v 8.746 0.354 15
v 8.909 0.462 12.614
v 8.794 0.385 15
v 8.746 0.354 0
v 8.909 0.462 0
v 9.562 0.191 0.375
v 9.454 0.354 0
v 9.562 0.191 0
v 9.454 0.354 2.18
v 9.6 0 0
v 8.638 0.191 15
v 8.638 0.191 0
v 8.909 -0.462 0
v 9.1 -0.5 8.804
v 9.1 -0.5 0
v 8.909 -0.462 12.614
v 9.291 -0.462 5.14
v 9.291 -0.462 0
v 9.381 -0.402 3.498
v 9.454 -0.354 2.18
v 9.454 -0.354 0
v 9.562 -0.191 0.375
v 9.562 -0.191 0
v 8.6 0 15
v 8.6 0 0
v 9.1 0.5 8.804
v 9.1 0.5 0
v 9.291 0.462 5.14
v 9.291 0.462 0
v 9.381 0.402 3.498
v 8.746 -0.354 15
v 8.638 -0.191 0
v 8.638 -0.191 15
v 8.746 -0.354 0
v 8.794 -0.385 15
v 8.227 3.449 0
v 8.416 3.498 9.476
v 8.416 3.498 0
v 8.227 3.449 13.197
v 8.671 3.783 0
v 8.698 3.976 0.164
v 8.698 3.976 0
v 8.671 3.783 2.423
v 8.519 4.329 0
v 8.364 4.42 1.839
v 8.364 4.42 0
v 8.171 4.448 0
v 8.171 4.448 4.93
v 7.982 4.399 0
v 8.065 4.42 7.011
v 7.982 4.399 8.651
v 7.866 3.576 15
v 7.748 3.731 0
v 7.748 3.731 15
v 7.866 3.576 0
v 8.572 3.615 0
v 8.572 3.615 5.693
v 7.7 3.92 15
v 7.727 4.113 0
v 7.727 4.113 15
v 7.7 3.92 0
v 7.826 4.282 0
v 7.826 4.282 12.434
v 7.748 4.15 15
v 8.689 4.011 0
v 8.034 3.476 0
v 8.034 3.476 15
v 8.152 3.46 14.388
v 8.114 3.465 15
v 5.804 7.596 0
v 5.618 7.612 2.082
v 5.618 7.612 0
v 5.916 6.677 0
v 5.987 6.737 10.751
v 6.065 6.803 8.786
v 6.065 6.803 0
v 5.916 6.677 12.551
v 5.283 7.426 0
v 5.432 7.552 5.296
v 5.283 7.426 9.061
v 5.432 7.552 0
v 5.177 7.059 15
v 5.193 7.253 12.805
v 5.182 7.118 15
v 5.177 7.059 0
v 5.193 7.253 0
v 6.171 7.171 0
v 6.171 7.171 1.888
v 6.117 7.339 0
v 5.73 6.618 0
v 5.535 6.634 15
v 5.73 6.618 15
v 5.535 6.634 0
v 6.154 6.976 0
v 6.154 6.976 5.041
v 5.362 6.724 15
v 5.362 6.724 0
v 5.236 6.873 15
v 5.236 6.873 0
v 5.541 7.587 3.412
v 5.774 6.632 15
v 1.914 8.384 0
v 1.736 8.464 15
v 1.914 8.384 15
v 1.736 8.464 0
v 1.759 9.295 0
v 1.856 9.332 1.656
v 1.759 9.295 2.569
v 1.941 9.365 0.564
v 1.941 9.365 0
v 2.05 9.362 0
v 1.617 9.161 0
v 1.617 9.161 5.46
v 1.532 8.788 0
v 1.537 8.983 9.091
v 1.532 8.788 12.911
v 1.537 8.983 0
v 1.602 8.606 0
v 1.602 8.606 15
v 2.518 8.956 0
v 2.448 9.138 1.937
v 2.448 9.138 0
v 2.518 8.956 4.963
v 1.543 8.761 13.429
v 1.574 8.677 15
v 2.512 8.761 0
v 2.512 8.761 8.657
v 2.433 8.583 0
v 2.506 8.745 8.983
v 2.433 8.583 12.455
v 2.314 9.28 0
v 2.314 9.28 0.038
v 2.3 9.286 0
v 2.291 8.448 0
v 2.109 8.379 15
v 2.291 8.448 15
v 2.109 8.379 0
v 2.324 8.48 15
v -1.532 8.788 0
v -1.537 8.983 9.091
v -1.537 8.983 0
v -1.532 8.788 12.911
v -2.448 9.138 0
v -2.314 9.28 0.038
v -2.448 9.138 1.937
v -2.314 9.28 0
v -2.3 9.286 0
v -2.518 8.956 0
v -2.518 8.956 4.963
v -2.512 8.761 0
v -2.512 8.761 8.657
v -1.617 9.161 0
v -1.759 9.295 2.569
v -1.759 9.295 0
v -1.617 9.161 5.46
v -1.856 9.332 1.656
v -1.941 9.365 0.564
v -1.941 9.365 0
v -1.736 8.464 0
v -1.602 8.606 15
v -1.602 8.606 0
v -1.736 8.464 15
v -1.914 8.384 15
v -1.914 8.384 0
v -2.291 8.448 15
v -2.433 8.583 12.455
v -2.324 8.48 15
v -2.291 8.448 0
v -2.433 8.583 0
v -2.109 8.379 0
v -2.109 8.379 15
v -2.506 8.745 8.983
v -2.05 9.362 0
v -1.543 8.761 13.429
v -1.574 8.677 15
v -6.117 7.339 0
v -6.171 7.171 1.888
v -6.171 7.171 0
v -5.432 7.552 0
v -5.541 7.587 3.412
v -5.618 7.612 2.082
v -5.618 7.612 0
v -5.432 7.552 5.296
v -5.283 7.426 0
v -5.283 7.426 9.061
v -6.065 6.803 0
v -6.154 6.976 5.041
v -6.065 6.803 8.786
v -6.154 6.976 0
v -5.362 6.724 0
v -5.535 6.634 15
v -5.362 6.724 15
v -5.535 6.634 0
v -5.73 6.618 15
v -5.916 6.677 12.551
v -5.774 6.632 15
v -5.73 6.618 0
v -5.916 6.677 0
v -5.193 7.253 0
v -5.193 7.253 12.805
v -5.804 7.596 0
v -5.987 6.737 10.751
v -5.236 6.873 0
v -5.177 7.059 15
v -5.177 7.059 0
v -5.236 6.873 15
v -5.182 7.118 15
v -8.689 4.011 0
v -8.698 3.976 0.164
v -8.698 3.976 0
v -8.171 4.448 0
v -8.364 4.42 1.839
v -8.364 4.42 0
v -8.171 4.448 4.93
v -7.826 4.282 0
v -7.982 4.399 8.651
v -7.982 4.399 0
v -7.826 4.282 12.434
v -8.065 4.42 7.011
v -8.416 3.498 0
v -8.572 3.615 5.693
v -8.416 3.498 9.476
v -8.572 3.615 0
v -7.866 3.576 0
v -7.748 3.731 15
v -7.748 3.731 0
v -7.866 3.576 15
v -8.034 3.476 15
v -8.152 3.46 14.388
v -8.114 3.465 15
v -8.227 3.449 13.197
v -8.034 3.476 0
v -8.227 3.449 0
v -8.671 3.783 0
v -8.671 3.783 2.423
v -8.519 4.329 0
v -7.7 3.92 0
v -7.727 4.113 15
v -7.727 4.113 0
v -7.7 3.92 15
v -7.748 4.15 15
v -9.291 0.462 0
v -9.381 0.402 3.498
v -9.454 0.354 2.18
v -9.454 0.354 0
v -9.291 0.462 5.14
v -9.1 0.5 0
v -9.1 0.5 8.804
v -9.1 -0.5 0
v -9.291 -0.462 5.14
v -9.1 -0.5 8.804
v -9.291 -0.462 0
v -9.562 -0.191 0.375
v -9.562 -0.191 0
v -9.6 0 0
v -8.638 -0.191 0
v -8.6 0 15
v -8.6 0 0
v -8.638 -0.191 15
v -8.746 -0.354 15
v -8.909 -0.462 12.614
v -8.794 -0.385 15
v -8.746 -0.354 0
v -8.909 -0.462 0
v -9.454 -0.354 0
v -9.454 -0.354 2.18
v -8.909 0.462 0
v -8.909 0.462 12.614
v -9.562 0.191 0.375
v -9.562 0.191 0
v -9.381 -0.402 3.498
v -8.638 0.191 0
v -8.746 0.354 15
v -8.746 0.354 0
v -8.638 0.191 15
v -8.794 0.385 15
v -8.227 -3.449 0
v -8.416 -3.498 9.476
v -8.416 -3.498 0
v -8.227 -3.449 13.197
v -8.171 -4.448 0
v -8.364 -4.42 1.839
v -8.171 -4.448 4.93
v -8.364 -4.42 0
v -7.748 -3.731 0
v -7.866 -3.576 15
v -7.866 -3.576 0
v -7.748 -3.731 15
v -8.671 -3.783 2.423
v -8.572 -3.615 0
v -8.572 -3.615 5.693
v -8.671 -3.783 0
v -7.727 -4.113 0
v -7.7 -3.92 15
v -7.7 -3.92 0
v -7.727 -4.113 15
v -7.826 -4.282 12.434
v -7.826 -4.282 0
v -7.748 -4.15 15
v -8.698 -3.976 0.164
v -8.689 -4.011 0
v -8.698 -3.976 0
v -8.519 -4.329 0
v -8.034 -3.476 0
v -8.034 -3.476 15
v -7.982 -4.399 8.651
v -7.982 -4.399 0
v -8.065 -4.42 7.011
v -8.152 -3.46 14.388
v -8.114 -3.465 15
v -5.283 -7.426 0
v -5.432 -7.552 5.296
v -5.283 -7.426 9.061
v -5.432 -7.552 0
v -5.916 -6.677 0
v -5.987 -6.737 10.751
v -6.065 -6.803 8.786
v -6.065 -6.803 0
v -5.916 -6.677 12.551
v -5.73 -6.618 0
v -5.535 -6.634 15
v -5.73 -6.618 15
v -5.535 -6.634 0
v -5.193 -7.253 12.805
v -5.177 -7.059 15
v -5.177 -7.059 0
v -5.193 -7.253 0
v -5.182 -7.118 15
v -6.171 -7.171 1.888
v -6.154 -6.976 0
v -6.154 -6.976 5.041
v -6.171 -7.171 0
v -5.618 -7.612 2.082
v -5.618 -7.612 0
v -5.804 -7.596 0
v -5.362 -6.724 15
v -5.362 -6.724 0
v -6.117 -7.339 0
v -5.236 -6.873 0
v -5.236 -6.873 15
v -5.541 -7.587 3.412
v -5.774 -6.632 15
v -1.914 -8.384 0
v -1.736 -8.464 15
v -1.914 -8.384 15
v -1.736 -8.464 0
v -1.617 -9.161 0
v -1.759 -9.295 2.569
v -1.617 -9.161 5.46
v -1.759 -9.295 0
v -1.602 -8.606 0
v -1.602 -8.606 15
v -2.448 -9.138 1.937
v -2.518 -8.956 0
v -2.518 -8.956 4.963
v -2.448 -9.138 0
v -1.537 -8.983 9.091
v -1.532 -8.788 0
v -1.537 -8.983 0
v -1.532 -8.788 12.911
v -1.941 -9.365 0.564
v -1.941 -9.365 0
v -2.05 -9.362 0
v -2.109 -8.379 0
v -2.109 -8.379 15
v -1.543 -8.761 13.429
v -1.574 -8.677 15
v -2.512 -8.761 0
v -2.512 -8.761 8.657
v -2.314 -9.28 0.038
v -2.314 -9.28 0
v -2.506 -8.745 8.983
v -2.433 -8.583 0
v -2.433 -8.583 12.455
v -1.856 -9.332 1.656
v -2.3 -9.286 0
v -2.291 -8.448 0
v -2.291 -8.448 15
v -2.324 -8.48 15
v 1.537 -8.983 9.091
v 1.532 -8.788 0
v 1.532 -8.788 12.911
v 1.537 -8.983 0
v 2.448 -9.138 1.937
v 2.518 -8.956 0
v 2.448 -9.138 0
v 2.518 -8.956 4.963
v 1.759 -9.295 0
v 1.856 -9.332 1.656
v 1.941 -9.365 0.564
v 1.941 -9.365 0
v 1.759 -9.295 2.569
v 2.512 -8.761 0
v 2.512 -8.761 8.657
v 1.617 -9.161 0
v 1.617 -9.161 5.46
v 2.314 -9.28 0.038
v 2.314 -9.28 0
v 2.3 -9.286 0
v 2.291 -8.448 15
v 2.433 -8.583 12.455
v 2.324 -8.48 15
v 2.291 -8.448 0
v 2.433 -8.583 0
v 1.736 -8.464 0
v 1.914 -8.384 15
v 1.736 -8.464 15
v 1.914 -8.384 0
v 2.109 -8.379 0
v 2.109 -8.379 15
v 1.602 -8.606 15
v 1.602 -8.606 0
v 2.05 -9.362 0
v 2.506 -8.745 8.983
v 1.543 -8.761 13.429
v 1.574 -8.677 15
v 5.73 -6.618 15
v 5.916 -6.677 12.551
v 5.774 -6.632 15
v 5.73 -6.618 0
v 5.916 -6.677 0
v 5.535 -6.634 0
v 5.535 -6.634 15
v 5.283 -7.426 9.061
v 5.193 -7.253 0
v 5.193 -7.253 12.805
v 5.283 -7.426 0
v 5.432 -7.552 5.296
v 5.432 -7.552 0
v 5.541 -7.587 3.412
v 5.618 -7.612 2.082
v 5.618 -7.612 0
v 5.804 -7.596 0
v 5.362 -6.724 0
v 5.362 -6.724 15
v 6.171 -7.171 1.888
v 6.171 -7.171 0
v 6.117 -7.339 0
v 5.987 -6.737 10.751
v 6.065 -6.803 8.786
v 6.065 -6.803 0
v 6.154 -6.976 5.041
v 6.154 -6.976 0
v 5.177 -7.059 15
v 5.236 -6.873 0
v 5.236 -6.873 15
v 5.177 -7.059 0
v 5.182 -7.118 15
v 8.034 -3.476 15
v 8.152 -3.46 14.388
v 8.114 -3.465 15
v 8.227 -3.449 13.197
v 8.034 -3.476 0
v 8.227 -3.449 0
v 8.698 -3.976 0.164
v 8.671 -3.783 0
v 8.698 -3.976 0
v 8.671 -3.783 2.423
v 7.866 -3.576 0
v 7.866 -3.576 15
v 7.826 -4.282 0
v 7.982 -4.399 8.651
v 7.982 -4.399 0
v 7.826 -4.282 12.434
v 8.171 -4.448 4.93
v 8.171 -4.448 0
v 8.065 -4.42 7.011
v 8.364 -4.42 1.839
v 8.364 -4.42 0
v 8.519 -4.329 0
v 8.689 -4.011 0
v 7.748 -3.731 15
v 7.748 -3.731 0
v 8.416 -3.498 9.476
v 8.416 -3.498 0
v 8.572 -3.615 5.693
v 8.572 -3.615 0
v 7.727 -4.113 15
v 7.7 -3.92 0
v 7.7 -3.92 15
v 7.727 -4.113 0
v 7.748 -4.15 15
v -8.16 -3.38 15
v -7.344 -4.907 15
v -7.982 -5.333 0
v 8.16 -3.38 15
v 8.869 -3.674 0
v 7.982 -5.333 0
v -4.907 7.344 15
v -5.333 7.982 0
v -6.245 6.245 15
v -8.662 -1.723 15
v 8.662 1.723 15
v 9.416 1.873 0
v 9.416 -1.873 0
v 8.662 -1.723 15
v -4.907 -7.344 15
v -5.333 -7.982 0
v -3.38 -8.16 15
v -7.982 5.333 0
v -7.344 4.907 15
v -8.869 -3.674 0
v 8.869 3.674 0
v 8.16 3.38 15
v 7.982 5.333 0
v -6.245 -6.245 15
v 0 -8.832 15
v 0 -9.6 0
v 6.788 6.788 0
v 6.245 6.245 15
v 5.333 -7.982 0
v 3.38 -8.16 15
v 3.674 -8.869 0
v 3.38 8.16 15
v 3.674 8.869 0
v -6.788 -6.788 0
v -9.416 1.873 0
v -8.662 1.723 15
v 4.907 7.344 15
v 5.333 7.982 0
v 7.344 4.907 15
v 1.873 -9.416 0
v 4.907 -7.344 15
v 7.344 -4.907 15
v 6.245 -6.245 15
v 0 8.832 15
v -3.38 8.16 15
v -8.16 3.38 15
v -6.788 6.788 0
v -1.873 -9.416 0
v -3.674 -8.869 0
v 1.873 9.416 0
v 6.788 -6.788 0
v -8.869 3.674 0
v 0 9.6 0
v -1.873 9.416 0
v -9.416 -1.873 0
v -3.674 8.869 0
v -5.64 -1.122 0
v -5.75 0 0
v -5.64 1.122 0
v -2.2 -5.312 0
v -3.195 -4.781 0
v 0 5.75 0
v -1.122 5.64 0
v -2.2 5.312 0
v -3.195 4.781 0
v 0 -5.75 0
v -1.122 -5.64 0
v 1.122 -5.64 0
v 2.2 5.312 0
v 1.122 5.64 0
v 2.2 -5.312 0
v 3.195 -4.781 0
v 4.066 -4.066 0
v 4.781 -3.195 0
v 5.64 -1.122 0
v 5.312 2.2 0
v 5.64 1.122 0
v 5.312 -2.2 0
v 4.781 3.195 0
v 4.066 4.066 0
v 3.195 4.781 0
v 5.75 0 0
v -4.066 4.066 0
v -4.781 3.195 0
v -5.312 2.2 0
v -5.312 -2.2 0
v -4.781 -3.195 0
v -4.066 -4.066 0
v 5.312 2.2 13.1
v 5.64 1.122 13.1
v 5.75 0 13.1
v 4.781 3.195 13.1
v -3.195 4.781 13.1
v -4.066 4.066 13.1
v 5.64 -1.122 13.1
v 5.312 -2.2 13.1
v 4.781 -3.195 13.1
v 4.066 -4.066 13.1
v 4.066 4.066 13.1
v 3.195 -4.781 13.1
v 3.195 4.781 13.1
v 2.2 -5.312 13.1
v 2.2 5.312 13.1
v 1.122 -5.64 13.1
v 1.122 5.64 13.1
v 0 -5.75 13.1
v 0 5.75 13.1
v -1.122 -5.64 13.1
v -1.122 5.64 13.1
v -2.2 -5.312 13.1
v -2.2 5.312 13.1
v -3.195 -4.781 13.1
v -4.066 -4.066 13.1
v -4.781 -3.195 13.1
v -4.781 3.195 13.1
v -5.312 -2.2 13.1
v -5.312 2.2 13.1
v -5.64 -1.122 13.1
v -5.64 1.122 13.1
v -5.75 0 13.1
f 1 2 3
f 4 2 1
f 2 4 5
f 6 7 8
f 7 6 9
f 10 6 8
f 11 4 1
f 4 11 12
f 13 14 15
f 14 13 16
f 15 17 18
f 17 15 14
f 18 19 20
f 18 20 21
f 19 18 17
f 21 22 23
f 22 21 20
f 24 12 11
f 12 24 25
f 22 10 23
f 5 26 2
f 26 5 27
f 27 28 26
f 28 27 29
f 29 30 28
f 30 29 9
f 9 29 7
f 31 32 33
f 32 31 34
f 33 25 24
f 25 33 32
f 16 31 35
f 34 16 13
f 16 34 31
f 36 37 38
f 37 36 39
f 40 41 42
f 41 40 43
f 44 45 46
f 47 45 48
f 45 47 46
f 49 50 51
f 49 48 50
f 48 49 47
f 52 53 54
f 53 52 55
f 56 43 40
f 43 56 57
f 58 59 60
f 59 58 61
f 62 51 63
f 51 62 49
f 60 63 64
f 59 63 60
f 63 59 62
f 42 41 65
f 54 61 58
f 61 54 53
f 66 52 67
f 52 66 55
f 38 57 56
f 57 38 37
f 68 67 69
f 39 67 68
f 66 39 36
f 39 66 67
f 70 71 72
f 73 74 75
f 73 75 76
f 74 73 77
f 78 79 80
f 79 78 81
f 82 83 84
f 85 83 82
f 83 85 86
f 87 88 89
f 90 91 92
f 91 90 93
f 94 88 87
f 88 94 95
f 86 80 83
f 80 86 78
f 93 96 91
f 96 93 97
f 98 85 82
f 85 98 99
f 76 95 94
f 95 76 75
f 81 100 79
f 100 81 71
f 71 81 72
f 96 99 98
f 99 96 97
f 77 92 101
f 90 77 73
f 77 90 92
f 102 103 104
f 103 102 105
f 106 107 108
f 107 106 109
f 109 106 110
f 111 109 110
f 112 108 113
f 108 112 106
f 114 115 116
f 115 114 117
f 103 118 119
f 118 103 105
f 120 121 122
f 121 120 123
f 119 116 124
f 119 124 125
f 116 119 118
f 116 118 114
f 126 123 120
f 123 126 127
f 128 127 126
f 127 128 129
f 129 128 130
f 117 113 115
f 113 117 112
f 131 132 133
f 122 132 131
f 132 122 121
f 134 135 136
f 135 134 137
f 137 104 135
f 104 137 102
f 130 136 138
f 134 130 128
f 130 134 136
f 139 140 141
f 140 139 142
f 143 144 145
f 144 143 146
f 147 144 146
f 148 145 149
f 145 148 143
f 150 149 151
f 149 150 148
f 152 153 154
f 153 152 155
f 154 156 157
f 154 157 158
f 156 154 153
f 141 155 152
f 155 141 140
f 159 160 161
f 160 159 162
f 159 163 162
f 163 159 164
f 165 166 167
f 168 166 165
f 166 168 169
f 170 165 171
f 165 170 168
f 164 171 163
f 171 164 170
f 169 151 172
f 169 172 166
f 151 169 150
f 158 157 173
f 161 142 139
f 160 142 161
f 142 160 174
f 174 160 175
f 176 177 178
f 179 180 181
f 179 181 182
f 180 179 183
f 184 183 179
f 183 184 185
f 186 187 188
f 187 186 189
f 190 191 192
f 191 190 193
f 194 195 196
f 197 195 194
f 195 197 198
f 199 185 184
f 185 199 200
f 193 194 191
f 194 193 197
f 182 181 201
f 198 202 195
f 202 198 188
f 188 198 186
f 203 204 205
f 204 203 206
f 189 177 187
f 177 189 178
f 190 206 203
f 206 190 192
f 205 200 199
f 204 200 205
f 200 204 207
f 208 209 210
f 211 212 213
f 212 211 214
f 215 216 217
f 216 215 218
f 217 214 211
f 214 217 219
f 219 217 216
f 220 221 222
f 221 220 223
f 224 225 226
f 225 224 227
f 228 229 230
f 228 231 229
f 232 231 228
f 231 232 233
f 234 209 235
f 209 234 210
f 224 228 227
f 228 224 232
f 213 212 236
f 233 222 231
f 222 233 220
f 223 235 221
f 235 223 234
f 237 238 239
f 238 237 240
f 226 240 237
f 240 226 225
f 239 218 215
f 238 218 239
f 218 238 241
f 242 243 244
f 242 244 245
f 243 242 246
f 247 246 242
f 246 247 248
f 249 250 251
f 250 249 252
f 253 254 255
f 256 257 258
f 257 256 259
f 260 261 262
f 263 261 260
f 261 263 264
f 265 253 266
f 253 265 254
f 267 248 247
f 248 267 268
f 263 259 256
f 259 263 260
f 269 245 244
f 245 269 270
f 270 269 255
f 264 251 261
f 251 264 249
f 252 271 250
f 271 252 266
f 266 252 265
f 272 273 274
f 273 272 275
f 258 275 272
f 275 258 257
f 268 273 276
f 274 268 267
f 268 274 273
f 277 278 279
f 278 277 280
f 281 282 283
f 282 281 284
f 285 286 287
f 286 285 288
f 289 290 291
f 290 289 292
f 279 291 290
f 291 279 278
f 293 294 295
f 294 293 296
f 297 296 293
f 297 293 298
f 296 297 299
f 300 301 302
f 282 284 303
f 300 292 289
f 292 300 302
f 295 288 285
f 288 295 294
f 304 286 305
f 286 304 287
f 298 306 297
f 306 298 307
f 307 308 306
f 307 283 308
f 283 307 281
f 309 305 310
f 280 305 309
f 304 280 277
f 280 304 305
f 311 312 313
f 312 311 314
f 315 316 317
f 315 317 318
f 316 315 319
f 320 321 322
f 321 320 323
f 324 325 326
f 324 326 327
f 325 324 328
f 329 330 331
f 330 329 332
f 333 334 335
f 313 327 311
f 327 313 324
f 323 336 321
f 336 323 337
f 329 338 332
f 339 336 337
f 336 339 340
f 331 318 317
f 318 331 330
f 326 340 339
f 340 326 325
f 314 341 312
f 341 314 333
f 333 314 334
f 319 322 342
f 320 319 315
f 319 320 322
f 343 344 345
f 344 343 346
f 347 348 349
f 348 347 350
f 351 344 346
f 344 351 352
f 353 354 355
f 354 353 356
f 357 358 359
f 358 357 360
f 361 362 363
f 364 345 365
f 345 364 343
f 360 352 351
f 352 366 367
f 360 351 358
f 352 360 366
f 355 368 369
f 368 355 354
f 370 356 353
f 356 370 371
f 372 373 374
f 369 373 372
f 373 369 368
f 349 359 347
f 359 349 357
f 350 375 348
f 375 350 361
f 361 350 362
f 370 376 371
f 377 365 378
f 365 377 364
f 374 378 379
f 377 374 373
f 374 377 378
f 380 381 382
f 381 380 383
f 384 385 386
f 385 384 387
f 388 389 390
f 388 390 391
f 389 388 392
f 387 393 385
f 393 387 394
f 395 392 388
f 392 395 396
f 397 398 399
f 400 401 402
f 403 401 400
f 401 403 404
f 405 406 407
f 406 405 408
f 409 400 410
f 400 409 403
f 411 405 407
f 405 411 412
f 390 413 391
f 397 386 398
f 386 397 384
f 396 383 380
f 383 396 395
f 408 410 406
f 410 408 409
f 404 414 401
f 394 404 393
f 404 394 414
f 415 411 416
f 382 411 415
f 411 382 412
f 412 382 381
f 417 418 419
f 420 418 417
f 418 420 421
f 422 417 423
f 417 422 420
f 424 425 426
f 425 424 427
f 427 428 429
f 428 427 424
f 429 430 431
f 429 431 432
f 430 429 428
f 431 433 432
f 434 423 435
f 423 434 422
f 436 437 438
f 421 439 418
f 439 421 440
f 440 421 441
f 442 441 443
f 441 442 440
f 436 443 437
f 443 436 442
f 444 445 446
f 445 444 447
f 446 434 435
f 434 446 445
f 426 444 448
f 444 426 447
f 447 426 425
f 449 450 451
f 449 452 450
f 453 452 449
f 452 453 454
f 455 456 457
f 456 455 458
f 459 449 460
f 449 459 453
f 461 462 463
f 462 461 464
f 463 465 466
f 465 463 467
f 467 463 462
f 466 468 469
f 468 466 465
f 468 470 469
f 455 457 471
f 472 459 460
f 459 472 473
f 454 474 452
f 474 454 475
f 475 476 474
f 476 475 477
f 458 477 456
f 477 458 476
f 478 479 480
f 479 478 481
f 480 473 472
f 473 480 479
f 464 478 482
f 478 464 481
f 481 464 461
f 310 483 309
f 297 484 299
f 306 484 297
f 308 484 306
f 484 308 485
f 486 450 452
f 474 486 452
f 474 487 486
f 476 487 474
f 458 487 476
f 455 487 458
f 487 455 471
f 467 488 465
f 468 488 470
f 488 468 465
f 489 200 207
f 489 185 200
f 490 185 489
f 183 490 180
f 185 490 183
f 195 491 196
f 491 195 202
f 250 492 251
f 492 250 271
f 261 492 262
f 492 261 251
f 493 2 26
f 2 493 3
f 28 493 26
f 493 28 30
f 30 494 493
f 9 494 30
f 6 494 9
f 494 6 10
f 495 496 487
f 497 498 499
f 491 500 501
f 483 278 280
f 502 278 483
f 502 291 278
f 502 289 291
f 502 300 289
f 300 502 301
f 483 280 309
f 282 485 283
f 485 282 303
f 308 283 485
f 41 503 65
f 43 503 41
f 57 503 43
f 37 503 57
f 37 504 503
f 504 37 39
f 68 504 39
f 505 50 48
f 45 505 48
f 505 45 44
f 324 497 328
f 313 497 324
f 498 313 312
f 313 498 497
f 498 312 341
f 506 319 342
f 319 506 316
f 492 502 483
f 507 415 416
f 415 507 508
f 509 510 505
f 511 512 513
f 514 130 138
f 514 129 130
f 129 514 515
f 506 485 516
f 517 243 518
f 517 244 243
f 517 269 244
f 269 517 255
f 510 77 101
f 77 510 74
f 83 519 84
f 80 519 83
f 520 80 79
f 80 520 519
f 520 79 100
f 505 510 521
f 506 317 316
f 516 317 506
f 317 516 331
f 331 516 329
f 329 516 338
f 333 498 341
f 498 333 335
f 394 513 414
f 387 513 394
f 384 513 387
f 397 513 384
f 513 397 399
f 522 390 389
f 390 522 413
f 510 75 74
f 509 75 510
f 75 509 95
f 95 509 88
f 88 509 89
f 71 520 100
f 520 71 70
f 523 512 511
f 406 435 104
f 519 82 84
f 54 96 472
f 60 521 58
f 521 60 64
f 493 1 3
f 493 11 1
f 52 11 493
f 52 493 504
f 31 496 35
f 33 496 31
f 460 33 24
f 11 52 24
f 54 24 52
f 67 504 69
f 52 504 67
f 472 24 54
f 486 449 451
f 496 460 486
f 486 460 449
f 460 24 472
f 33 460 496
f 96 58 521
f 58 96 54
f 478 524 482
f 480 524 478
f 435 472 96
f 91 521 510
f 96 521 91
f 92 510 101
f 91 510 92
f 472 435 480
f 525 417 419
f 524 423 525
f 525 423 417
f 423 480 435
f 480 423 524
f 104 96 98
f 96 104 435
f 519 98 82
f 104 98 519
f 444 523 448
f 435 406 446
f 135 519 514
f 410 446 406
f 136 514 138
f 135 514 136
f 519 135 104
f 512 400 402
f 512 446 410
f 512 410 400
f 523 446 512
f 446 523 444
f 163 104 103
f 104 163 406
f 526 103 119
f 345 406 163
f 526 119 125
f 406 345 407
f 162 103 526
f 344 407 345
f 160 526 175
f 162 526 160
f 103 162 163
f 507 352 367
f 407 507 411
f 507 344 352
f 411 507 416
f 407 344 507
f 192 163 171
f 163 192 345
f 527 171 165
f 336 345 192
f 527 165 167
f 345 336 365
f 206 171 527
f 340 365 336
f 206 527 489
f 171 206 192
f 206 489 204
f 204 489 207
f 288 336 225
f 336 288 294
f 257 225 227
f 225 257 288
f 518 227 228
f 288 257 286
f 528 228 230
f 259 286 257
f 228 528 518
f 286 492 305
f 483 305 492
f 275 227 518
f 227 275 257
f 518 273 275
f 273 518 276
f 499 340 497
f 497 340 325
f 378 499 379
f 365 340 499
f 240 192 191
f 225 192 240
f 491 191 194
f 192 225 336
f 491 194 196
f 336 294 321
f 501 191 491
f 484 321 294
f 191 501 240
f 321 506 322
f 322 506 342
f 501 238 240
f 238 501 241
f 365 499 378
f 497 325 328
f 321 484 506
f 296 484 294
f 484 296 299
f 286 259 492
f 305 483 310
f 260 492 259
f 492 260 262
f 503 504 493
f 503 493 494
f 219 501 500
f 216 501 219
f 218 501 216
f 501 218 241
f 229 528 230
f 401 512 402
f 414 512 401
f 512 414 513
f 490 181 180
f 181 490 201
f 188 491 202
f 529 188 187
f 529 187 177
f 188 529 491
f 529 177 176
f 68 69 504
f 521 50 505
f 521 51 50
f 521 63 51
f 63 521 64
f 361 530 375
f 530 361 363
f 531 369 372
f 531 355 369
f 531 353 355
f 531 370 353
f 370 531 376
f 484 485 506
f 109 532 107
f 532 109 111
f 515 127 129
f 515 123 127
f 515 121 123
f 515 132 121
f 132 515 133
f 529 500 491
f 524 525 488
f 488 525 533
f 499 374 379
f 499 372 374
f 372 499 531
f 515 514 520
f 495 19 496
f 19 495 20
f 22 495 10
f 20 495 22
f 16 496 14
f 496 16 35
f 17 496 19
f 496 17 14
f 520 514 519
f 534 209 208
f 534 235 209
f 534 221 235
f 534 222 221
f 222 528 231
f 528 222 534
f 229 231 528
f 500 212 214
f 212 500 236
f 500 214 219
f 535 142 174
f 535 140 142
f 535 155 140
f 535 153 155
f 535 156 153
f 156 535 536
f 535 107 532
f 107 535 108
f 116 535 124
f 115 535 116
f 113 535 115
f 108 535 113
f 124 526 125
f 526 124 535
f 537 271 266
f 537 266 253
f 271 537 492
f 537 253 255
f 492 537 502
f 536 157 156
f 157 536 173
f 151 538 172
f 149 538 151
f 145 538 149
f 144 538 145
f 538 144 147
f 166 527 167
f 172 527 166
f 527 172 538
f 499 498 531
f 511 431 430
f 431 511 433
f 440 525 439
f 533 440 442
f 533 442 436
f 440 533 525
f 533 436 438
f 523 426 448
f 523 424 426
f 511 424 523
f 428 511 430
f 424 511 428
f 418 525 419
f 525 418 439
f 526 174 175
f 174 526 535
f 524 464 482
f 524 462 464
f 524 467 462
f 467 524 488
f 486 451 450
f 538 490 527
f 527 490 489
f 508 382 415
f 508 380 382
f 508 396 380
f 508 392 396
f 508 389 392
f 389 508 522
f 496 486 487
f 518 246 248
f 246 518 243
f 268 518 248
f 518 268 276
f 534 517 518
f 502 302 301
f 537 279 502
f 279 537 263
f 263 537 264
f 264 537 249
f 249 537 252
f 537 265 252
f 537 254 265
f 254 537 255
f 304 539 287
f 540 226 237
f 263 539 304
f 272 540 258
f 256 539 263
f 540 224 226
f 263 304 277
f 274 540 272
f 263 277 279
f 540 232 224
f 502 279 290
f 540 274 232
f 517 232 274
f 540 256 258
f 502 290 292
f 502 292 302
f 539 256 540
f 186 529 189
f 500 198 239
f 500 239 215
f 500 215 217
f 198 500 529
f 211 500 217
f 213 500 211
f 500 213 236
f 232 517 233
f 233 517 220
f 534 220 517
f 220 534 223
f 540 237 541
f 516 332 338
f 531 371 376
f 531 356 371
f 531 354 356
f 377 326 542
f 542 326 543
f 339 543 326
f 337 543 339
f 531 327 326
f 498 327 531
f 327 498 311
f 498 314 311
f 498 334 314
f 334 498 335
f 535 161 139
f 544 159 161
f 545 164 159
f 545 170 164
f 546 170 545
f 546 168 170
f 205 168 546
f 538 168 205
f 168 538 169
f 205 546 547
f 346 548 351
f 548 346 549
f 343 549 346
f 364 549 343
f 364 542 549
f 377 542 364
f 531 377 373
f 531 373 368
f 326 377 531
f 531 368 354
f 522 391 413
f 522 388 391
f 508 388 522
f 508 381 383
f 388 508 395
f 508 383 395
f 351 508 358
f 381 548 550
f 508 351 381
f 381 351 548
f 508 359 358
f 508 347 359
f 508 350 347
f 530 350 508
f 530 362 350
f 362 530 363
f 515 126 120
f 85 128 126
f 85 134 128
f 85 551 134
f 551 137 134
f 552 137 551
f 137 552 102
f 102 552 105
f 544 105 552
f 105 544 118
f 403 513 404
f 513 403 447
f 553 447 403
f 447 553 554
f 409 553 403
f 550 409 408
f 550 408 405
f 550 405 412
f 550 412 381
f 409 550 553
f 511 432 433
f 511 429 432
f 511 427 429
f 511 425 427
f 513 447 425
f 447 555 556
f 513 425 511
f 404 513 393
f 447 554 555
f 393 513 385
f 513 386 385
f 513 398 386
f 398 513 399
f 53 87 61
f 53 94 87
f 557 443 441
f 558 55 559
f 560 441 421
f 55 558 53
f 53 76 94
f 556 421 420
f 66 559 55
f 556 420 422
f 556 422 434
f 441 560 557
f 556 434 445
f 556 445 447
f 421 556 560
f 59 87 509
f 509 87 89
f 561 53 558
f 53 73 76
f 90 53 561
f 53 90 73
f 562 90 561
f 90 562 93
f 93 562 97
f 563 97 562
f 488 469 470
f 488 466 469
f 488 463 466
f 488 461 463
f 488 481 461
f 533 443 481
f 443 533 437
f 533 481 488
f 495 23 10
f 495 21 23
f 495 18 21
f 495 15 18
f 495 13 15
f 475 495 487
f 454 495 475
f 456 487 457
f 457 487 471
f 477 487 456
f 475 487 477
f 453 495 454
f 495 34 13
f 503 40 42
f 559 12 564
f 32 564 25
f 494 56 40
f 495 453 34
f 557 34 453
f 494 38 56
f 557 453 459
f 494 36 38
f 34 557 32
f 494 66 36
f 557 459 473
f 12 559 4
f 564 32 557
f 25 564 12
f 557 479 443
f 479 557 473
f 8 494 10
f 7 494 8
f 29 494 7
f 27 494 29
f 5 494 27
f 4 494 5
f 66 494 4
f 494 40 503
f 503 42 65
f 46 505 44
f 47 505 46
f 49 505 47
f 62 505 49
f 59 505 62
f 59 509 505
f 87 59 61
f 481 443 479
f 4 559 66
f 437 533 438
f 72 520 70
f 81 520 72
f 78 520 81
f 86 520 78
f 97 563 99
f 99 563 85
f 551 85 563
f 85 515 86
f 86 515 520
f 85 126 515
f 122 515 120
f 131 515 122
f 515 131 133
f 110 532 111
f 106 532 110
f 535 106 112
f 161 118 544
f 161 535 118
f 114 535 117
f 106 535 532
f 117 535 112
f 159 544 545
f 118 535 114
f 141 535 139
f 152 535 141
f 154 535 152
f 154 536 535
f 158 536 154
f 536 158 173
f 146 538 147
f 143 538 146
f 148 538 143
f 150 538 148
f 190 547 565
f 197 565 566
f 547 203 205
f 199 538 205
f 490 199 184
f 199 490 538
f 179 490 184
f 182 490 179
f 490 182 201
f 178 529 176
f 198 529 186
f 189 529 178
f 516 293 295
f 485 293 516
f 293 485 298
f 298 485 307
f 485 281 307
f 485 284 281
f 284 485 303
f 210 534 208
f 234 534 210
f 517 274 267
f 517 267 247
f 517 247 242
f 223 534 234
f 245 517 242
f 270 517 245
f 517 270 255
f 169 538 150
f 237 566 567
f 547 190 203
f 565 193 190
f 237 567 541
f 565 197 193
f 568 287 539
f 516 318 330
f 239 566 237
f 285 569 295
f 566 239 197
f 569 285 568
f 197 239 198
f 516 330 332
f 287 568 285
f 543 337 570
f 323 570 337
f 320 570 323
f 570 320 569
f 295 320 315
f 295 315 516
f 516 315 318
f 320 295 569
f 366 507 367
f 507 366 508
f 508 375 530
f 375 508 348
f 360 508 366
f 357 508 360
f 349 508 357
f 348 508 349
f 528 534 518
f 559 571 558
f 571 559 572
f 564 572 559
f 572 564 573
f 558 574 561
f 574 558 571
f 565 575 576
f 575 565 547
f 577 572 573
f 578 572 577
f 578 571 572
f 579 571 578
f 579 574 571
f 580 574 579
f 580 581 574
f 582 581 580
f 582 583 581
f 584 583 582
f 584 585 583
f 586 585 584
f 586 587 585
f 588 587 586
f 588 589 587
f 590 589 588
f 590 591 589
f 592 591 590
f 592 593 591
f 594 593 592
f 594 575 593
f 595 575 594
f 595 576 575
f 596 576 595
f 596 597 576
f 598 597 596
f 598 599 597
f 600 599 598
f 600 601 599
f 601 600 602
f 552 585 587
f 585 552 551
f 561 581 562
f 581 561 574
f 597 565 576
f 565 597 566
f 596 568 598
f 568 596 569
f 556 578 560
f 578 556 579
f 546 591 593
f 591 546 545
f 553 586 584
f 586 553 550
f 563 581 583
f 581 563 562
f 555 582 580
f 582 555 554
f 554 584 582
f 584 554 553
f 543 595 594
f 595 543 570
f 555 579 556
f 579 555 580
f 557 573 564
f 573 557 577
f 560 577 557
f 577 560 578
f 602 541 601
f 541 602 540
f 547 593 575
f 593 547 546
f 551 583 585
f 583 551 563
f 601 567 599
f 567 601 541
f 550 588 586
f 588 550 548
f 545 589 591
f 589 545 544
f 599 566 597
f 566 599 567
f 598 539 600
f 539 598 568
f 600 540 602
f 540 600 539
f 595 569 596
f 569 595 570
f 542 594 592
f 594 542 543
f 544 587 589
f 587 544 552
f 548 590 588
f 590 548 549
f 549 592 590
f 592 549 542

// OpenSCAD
// ACCESS KNOB — Mutable Instruments Small Module Knob (Slip-On Sleeve)
// Generated via CLI for Studio Knobs (Slip-On Sleeve)
module access_knob_mi_small_slipon() {
  outer_d = 19.2;
  height = 15;
  taper = 0.92;
  bore_d = 11.2;
  slot_h = 13;
  tex_depth = 1;
  tex_scale = 1;
  tex_count = 14;

  difference() {
    cylinder(h=height, d1=outer_d, d2=outer_d*taper, $fn=32);
    translate([0,0,-0.1]) cylinder(h=slot_h+0.2, d=bore_d + 0.3, $fn=32);
    for(i=[0:tex_count-1]) {
      rotate([0,0,i*(360/tex_count)])
        translate([outer_d/2-tex_depth/2, 0, height/2])
          cylinder(h=height*1.1, d=tex_scale, center=true, $fn=16);
    }
  }
}
access_knob_mi_small_slipon();
